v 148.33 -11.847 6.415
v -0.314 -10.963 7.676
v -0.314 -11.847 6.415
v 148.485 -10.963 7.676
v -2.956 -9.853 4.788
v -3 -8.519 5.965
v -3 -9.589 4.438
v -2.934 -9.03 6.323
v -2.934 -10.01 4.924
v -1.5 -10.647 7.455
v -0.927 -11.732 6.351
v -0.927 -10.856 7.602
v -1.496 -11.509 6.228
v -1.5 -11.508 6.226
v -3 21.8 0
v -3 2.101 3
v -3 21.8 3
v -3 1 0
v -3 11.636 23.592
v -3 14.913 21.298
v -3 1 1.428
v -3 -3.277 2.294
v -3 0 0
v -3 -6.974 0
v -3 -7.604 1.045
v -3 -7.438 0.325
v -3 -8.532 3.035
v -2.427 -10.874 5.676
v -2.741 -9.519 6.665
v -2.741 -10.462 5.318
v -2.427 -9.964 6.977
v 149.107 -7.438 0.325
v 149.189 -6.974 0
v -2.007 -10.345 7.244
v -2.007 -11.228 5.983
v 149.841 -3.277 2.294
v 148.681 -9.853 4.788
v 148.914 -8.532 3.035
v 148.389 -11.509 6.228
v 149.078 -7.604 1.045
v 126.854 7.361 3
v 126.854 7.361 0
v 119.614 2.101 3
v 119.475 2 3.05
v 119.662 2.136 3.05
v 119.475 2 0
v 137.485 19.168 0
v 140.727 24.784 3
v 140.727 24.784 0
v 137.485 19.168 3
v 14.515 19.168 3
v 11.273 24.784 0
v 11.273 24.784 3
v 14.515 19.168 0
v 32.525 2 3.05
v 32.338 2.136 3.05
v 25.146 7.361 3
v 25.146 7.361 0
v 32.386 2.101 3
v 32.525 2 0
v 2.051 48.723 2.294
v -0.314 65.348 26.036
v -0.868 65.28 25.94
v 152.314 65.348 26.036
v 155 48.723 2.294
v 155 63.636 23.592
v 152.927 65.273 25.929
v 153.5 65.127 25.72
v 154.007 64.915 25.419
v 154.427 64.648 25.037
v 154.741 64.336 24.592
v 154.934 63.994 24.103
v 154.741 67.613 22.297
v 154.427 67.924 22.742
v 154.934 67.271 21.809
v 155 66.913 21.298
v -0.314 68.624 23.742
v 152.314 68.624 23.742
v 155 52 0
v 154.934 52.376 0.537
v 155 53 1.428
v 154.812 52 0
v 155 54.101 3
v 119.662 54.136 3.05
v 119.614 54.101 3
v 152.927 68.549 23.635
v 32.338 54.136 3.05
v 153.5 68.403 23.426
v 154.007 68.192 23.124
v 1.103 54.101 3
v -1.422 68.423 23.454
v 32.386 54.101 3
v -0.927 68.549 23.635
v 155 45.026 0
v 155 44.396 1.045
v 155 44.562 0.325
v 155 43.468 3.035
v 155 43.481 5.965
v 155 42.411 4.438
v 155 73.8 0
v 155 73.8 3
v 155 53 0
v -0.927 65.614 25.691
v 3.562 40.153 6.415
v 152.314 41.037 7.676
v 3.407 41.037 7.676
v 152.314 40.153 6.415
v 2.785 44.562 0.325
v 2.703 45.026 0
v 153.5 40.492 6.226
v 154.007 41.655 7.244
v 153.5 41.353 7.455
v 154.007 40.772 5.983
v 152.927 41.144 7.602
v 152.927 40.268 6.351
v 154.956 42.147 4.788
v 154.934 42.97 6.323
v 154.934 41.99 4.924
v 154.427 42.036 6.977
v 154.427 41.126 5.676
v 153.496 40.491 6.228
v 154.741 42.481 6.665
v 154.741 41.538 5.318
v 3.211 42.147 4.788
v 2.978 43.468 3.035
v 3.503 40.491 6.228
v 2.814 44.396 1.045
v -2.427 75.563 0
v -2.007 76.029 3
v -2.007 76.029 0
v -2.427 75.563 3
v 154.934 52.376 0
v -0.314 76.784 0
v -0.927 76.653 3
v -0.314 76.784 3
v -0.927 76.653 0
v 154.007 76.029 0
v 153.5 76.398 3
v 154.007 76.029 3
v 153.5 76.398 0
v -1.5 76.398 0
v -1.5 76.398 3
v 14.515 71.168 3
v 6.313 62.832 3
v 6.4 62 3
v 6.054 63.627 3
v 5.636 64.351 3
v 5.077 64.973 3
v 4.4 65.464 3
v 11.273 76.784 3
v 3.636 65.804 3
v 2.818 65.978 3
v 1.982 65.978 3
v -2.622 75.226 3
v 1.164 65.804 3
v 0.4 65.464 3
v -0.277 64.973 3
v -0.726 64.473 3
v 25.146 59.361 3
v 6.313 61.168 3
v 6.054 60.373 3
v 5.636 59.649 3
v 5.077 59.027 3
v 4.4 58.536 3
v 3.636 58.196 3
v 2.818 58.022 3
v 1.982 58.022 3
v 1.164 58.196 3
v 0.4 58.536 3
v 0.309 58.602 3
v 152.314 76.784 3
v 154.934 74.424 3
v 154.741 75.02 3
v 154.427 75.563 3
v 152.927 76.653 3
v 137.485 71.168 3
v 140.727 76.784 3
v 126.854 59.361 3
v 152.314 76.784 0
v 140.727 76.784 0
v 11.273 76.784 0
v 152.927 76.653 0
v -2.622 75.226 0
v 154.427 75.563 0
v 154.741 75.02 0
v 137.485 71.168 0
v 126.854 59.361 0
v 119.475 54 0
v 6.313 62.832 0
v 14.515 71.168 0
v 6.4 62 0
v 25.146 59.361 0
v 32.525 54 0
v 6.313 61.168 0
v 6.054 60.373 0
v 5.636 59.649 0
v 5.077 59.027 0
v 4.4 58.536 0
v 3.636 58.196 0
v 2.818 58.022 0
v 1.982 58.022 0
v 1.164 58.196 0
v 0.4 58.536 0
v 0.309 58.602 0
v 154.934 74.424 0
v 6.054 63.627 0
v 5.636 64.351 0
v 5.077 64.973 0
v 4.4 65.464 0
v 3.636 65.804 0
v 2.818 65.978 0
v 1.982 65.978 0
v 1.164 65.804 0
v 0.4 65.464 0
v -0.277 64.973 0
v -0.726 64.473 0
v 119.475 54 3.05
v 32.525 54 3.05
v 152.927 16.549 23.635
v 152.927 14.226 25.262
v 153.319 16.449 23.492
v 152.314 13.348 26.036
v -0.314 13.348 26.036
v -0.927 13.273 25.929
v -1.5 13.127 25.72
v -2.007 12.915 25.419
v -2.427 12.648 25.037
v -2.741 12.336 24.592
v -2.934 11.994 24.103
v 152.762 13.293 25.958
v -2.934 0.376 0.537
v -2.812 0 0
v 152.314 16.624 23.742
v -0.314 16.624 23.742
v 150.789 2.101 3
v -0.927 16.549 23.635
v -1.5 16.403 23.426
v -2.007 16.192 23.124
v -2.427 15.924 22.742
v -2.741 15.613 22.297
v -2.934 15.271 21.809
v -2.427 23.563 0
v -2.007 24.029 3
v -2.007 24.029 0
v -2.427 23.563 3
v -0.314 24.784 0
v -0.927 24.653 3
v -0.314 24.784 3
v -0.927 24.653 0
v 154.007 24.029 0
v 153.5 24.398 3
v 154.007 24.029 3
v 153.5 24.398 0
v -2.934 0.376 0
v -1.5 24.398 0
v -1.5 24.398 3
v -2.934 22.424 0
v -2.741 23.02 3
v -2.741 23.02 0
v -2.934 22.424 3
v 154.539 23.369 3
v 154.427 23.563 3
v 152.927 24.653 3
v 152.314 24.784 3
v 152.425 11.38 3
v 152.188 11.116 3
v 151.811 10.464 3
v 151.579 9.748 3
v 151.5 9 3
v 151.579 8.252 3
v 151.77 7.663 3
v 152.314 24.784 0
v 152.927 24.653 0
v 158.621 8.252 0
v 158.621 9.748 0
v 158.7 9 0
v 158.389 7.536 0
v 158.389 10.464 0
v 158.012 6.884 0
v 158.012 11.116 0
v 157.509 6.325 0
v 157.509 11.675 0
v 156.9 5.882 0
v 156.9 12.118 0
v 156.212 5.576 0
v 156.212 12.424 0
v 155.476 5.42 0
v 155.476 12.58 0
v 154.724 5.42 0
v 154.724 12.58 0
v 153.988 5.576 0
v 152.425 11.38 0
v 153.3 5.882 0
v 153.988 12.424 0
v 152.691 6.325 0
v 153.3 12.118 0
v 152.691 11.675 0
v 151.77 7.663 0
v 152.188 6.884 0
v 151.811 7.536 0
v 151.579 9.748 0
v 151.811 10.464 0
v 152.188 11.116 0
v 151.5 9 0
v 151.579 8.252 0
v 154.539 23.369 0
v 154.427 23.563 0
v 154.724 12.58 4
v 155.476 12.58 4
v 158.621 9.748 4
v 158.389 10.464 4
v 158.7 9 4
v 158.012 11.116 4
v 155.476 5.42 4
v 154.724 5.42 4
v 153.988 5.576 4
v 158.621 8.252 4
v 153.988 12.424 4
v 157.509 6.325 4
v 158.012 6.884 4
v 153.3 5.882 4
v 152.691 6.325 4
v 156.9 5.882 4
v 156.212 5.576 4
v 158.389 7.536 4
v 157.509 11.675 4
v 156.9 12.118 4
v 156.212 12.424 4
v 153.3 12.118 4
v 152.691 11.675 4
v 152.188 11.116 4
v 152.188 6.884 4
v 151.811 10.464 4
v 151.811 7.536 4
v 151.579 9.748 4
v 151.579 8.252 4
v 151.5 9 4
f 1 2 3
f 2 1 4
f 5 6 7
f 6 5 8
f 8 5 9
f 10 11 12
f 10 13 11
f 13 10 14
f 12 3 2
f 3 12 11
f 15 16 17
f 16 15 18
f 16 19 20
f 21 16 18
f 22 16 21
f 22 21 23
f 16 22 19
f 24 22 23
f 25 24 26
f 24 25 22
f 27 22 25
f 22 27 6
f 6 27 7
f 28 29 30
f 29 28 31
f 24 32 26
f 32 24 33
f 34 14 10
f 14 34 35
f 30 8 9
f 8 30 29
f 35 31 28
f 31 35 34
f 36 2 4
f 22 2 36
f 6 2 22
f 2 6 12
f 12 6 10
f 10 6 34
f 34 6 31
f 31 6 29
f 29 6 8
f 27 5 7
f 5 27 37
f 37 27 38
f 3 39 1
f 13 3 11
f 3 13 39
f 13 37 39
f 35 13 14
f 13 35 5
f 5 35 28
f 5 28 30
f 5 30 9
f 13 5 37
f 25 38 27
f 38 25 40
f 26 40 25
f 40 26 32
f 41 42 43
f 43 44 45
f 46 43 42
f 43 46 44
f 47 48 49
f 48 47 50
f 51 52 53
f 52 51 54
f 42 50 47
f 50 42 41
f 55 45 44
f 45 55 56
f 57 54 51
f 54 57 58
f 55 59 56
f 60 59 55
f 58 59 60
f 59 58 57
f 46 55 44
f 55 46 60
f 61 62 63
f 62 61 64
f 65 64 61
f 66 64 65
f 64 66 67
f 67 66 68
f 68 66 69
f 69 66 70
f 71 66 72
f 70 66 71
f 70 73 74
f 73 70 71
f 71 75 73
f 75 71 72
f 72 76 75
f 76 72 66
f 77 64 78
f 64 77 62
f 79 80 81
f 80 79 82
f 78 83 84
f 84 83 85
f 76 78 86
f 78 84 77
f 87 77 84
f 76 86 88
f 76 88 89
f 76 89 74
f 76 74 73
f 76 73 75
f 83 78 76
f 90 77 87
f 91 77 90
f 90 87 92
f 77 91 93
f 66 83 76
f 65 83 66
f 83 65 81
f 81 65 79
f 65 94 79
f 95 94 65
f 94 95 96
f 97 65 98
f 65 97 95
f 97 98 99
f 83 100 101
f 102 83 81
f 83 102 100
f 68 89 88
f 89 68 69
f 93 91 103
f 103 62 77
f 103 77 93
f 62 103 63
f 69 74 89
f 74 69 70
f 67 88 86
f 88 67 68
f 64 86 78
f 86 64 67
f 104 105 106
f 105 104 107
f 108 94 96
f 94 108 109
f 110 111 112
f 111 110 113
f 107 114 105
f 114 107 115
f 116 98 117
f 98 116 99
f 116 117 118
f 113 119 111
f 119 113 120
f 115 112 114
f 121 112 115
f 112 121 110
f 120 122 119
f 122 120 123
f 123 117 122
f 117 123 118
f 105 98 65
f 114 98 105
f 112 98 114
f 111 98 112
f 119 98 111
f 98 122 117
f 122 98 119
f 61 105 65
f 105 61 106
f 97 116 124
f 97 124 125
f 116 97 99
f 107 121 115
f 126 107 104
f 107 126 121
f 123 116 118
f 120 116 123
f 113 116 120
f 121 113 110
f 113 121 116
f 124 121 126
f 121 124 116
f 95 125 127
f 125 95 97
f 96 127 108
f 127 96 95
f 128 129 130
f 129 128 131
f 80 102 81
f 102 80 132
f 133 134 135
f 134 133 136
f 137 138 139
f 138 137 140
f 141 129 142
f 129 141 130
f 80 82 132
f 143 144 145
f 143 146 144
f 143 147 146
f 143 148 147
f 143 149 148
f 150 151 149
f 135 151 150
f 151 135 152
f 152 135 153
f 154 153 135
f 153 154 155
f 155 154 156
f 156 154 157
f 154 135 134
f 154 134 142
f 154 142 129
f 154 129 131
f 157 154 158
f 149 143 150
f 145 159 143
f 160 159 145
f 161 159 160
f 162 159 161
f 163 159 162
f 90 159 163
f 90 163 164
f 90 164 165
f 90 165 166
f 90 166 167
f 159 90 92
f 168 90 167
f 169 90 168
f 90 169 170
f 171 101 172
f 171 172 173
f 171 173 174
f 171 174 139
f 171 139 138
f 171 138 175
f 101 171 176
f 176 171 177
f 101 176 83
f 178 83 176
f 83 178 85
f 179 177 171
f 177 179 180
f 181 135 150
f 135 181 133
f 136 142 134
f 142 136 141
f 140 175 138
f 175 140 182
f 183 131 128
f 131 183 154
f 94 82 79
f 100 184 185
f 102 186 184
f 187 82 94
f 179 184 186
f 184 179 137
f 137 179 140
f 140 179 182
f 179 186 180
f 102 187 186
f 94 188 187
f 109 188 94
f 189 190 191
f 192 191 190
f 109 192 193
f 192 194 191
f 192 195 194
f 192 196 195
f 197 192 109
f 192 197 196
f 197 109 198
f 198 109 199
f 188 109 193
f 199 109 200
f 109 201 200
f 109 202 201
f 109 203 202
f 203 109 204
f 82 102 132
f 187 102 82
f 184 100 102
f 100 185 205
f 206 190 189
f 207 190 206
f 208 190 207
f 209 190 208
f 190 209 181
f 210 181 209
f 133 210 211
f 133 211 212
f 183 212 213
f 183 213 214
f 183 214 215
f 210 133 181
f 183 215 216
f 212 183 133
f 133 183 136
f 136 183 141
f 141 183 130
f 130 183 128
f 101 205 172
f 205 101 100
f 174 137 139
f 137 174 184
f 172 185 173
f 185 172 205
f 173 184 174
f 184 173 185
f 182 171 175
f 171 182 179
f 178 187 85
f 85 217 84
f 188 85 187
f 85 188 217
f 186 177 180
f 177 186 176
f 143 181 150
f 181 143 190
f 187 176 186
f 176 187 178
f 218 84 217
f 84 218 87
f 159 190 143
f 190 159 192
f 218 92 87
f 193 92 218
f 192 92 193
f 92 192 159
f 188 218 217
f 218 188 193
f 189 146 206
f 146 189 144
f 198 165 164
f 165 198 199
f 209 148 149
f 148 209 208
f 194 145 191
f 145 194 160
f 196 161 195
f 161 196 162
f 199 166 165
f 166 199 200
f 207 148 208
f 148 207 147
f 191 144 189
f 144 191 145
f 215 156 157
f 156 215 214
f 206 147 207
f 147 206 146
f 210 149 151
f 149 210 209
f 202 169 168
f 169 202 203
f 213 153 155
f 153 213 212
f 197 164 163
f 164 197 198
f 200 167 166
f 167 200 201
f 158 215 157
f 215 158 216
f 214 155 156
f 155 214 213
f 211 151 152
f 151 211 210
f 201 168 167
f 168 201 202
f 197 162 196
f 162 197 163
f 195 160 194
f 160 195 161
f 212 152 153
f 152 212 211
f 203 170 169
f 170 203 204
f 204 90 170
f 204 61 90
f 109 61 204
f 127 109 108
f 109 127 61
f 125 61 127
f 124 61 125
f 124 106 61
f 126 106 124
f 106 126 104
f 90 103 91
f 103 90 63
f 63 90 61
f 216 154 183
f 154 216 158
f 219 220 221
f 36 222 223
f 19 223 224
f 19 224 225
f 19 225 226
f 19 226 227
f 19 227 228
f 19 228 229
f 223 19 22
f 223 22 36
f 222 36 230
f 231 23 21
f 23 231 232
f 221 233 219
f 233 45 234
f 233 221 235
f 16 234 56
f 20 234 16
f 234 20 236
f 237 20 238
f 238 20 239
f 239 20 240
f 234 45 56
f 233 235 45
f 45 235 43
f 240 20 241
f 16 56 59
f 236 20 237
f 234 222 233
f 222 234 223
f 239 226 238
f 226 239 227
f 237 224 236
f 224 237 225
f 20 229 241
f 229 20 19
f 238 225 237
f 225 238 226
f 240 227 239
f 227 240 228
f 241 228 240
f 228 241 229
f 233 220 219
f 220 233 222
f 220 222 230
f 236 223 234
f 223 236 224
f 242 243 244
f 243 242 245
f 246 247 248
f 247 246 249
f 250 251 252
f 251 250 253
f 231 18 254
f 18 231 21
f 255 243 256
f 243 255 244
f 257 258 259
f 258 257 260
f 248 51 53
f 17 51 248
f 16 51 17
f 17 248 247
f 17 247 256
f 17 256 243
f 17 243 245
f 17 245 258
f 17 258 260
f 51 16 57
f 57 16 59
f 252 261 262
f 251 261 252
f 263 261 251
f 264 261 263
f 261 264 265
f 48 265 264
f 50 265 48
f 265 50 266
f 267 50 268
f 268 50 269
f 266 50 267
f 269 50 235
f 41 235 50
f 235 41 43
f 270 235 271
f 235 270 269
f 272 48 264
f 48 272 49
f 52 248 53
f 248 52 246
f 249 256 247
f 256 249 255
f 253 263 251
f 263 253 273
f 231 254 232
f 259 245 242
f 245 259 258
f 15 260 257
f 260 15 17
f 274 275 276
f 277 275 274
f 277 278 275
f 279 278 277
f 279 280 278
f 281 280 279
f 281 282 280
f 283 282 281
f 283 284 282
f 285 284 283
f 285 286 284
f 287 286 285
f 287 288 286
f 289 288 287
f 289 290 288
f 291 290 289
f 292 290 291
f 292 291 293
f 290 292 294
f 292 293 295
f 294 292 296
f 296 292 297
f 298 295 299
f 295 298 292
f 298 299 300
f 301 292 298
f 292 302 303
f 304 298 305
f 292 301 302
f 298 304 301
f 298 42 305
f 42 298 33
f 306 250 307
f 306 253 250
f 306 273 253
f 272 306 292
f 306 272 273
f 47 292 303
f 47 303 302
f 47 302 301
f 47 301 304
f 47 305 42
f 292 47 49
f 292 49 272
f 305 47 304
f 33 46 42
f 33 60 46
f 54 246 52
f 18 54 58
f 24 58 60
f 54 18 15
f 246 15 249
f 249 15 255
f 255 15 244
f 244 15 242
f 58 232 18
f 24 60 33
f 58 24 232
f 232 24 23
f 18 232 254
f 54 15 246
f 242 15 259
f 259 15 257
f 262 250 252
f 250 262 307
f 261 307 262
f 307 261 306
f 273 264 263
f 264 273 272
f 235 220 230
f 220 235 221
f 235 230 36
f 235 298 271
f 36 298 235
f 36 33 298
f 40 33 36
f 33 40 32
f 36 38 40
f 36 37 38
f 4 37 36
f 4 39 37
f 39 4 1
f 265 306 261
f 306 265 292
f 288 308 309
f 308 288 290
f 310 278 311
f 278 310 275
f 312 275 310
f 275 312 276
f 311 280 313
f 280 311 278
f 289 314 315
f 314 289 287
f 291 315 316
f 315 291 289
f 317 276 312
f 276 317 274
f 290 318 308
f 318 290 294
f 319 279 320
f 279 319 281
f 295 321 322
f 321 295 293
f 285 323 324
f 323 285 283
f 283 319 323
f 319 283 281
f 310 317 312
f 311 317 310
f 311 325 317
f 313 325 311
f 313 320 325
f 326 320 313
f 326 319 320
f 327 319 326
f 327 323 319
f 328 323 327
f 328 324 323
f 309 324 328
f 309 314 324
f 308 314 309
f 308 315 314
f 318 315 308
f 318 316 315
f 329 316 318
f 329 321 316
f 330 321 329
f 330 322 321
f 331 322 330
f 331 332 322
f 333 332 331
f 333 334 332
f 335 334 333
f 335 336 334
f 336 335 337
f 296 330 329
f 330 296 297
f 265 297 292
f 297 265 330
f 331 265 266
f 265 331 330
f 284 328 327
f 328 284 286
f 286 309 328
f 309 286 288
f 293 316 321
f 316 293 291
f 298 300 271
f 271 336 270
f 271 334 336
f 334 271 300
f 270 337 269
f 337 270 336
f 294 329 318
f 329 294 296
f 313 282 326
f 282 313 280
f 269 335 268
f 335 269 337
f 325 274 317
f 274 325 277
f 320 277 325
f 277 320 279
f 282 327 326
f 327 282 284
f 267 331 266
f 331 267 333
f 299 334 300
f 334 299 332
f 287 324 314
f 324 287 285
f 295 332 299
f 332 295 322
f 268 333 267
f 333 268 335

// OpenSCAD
// A simple holder for game tiles

// Make the curves more curvey
$fs=0.2;

tileHeight=26;
tileWidth=19;
tileDepth=13;
tileNumber=7;

standWidth= tileWidth * ( tileNumber + 1 );

module holder (side) {
    dragon_x_r = ( side == "right" ) ? 3 : 0;
    dragon_x_l = ( side == "right" ) ? 17 : 20;
    difference () {
        union () {
            // Stand
            rotate ([55,0,0]) {
              difference () {
                  minkowski() {
                    cube ([standWidth, tileHeight, 3]);
                    cylinder(r=3, h=1);
                  }
                  // for right x = 3 and 17 for these two translates

                  translate ([dragon_x_r,18,3]) {
                    linear_extrude(file = "clipart/dragon-1275922881.dxf", 
                      height = 6, center = false, convexity = 10,  scale=0.3);
                  }
                  translate ([standWidth -dragon_x_l,18,3]) {
                    linear_extrude(file = "clipart/dragon-1275922881.dxf", 
                      height = 6, center = false, convexity = 10,  scale=0.3);
                  }
              }

            }
            // bottom
            translate([0, 1, 0]) {
                minkowski() {
                  cube ([standWidth, tileHeight * 0.8, 2]);
                  cylinder(r=3, h=1);
                }
            }
            // lip
            rotate ([145,0,0]) {
              difference () {
                  minkowski() {
                    cube ([standWidth, tileDepth * 0.8, 3]);
                    cylinder(r=3, h=1);
                  }
                  translate ([-4,13,12]) {
                      rotate ([0,90,0]) {
                        cylinder (h=standWidth * 1.2, r=10.5);
                      }
                  }
              }
            }
        }
        translate ([-4,-10,-10]) {
            cube ([standWidth + 8, tileHeight * 1.5, 10]);
        }
        // Stand arch
        difference () {
          translate ([standWidth * 0.5, standWidth * 0.42, -0.1]) {
            cylinder (r=standWidth * 0.5, h=3.15);
          }
          translate ([0, -13, -0.1]) {
            cube ([standWidth,15,5]);
          }
        }
    }
}

module rightHolder () {
    difference () {
        holder (side="right");
        // hole for clip
        translate ([2.4,10,0]) {
          cylinder ( r=4, h=4);
        }
        translate ([5,-20,0]) {
          rotate ([0,0,100]) {
            cube ([tileHeight * 2, 7, tileHeight * 1.1]);
          }
        }
    }

}
module leftHolder () {
    union () {
        difference () {
            holder (side="left");
            translate ([standWidth +2,-20,0]) {
              rotate ([0,0,80]) {
                cube ([tileHeight * 2, 7, tileHeight * 1.1]);
              }
            }
        }
        // peg for clip
        translate ([standWidth + 5.5 - 2.4,9,0]) {
           cylinder ( r=3.6, h=4);
        }
    }

}

module bothTogether () {
    // Show them both connected together
    translate ([standWidth-2.7,0.5,0]) {
      rotate ([0,0,-20]) {
        rightHolder ();
      }
    }
    leftHolder ();
}

module bothForPrint () {
    // Show them both next to each other for printing
    translate([0, tileHeight * 2, 0]) {
      rightHolder ();
    }
    leftHolder ();
}

bothForPrint();
// bothTogether();
